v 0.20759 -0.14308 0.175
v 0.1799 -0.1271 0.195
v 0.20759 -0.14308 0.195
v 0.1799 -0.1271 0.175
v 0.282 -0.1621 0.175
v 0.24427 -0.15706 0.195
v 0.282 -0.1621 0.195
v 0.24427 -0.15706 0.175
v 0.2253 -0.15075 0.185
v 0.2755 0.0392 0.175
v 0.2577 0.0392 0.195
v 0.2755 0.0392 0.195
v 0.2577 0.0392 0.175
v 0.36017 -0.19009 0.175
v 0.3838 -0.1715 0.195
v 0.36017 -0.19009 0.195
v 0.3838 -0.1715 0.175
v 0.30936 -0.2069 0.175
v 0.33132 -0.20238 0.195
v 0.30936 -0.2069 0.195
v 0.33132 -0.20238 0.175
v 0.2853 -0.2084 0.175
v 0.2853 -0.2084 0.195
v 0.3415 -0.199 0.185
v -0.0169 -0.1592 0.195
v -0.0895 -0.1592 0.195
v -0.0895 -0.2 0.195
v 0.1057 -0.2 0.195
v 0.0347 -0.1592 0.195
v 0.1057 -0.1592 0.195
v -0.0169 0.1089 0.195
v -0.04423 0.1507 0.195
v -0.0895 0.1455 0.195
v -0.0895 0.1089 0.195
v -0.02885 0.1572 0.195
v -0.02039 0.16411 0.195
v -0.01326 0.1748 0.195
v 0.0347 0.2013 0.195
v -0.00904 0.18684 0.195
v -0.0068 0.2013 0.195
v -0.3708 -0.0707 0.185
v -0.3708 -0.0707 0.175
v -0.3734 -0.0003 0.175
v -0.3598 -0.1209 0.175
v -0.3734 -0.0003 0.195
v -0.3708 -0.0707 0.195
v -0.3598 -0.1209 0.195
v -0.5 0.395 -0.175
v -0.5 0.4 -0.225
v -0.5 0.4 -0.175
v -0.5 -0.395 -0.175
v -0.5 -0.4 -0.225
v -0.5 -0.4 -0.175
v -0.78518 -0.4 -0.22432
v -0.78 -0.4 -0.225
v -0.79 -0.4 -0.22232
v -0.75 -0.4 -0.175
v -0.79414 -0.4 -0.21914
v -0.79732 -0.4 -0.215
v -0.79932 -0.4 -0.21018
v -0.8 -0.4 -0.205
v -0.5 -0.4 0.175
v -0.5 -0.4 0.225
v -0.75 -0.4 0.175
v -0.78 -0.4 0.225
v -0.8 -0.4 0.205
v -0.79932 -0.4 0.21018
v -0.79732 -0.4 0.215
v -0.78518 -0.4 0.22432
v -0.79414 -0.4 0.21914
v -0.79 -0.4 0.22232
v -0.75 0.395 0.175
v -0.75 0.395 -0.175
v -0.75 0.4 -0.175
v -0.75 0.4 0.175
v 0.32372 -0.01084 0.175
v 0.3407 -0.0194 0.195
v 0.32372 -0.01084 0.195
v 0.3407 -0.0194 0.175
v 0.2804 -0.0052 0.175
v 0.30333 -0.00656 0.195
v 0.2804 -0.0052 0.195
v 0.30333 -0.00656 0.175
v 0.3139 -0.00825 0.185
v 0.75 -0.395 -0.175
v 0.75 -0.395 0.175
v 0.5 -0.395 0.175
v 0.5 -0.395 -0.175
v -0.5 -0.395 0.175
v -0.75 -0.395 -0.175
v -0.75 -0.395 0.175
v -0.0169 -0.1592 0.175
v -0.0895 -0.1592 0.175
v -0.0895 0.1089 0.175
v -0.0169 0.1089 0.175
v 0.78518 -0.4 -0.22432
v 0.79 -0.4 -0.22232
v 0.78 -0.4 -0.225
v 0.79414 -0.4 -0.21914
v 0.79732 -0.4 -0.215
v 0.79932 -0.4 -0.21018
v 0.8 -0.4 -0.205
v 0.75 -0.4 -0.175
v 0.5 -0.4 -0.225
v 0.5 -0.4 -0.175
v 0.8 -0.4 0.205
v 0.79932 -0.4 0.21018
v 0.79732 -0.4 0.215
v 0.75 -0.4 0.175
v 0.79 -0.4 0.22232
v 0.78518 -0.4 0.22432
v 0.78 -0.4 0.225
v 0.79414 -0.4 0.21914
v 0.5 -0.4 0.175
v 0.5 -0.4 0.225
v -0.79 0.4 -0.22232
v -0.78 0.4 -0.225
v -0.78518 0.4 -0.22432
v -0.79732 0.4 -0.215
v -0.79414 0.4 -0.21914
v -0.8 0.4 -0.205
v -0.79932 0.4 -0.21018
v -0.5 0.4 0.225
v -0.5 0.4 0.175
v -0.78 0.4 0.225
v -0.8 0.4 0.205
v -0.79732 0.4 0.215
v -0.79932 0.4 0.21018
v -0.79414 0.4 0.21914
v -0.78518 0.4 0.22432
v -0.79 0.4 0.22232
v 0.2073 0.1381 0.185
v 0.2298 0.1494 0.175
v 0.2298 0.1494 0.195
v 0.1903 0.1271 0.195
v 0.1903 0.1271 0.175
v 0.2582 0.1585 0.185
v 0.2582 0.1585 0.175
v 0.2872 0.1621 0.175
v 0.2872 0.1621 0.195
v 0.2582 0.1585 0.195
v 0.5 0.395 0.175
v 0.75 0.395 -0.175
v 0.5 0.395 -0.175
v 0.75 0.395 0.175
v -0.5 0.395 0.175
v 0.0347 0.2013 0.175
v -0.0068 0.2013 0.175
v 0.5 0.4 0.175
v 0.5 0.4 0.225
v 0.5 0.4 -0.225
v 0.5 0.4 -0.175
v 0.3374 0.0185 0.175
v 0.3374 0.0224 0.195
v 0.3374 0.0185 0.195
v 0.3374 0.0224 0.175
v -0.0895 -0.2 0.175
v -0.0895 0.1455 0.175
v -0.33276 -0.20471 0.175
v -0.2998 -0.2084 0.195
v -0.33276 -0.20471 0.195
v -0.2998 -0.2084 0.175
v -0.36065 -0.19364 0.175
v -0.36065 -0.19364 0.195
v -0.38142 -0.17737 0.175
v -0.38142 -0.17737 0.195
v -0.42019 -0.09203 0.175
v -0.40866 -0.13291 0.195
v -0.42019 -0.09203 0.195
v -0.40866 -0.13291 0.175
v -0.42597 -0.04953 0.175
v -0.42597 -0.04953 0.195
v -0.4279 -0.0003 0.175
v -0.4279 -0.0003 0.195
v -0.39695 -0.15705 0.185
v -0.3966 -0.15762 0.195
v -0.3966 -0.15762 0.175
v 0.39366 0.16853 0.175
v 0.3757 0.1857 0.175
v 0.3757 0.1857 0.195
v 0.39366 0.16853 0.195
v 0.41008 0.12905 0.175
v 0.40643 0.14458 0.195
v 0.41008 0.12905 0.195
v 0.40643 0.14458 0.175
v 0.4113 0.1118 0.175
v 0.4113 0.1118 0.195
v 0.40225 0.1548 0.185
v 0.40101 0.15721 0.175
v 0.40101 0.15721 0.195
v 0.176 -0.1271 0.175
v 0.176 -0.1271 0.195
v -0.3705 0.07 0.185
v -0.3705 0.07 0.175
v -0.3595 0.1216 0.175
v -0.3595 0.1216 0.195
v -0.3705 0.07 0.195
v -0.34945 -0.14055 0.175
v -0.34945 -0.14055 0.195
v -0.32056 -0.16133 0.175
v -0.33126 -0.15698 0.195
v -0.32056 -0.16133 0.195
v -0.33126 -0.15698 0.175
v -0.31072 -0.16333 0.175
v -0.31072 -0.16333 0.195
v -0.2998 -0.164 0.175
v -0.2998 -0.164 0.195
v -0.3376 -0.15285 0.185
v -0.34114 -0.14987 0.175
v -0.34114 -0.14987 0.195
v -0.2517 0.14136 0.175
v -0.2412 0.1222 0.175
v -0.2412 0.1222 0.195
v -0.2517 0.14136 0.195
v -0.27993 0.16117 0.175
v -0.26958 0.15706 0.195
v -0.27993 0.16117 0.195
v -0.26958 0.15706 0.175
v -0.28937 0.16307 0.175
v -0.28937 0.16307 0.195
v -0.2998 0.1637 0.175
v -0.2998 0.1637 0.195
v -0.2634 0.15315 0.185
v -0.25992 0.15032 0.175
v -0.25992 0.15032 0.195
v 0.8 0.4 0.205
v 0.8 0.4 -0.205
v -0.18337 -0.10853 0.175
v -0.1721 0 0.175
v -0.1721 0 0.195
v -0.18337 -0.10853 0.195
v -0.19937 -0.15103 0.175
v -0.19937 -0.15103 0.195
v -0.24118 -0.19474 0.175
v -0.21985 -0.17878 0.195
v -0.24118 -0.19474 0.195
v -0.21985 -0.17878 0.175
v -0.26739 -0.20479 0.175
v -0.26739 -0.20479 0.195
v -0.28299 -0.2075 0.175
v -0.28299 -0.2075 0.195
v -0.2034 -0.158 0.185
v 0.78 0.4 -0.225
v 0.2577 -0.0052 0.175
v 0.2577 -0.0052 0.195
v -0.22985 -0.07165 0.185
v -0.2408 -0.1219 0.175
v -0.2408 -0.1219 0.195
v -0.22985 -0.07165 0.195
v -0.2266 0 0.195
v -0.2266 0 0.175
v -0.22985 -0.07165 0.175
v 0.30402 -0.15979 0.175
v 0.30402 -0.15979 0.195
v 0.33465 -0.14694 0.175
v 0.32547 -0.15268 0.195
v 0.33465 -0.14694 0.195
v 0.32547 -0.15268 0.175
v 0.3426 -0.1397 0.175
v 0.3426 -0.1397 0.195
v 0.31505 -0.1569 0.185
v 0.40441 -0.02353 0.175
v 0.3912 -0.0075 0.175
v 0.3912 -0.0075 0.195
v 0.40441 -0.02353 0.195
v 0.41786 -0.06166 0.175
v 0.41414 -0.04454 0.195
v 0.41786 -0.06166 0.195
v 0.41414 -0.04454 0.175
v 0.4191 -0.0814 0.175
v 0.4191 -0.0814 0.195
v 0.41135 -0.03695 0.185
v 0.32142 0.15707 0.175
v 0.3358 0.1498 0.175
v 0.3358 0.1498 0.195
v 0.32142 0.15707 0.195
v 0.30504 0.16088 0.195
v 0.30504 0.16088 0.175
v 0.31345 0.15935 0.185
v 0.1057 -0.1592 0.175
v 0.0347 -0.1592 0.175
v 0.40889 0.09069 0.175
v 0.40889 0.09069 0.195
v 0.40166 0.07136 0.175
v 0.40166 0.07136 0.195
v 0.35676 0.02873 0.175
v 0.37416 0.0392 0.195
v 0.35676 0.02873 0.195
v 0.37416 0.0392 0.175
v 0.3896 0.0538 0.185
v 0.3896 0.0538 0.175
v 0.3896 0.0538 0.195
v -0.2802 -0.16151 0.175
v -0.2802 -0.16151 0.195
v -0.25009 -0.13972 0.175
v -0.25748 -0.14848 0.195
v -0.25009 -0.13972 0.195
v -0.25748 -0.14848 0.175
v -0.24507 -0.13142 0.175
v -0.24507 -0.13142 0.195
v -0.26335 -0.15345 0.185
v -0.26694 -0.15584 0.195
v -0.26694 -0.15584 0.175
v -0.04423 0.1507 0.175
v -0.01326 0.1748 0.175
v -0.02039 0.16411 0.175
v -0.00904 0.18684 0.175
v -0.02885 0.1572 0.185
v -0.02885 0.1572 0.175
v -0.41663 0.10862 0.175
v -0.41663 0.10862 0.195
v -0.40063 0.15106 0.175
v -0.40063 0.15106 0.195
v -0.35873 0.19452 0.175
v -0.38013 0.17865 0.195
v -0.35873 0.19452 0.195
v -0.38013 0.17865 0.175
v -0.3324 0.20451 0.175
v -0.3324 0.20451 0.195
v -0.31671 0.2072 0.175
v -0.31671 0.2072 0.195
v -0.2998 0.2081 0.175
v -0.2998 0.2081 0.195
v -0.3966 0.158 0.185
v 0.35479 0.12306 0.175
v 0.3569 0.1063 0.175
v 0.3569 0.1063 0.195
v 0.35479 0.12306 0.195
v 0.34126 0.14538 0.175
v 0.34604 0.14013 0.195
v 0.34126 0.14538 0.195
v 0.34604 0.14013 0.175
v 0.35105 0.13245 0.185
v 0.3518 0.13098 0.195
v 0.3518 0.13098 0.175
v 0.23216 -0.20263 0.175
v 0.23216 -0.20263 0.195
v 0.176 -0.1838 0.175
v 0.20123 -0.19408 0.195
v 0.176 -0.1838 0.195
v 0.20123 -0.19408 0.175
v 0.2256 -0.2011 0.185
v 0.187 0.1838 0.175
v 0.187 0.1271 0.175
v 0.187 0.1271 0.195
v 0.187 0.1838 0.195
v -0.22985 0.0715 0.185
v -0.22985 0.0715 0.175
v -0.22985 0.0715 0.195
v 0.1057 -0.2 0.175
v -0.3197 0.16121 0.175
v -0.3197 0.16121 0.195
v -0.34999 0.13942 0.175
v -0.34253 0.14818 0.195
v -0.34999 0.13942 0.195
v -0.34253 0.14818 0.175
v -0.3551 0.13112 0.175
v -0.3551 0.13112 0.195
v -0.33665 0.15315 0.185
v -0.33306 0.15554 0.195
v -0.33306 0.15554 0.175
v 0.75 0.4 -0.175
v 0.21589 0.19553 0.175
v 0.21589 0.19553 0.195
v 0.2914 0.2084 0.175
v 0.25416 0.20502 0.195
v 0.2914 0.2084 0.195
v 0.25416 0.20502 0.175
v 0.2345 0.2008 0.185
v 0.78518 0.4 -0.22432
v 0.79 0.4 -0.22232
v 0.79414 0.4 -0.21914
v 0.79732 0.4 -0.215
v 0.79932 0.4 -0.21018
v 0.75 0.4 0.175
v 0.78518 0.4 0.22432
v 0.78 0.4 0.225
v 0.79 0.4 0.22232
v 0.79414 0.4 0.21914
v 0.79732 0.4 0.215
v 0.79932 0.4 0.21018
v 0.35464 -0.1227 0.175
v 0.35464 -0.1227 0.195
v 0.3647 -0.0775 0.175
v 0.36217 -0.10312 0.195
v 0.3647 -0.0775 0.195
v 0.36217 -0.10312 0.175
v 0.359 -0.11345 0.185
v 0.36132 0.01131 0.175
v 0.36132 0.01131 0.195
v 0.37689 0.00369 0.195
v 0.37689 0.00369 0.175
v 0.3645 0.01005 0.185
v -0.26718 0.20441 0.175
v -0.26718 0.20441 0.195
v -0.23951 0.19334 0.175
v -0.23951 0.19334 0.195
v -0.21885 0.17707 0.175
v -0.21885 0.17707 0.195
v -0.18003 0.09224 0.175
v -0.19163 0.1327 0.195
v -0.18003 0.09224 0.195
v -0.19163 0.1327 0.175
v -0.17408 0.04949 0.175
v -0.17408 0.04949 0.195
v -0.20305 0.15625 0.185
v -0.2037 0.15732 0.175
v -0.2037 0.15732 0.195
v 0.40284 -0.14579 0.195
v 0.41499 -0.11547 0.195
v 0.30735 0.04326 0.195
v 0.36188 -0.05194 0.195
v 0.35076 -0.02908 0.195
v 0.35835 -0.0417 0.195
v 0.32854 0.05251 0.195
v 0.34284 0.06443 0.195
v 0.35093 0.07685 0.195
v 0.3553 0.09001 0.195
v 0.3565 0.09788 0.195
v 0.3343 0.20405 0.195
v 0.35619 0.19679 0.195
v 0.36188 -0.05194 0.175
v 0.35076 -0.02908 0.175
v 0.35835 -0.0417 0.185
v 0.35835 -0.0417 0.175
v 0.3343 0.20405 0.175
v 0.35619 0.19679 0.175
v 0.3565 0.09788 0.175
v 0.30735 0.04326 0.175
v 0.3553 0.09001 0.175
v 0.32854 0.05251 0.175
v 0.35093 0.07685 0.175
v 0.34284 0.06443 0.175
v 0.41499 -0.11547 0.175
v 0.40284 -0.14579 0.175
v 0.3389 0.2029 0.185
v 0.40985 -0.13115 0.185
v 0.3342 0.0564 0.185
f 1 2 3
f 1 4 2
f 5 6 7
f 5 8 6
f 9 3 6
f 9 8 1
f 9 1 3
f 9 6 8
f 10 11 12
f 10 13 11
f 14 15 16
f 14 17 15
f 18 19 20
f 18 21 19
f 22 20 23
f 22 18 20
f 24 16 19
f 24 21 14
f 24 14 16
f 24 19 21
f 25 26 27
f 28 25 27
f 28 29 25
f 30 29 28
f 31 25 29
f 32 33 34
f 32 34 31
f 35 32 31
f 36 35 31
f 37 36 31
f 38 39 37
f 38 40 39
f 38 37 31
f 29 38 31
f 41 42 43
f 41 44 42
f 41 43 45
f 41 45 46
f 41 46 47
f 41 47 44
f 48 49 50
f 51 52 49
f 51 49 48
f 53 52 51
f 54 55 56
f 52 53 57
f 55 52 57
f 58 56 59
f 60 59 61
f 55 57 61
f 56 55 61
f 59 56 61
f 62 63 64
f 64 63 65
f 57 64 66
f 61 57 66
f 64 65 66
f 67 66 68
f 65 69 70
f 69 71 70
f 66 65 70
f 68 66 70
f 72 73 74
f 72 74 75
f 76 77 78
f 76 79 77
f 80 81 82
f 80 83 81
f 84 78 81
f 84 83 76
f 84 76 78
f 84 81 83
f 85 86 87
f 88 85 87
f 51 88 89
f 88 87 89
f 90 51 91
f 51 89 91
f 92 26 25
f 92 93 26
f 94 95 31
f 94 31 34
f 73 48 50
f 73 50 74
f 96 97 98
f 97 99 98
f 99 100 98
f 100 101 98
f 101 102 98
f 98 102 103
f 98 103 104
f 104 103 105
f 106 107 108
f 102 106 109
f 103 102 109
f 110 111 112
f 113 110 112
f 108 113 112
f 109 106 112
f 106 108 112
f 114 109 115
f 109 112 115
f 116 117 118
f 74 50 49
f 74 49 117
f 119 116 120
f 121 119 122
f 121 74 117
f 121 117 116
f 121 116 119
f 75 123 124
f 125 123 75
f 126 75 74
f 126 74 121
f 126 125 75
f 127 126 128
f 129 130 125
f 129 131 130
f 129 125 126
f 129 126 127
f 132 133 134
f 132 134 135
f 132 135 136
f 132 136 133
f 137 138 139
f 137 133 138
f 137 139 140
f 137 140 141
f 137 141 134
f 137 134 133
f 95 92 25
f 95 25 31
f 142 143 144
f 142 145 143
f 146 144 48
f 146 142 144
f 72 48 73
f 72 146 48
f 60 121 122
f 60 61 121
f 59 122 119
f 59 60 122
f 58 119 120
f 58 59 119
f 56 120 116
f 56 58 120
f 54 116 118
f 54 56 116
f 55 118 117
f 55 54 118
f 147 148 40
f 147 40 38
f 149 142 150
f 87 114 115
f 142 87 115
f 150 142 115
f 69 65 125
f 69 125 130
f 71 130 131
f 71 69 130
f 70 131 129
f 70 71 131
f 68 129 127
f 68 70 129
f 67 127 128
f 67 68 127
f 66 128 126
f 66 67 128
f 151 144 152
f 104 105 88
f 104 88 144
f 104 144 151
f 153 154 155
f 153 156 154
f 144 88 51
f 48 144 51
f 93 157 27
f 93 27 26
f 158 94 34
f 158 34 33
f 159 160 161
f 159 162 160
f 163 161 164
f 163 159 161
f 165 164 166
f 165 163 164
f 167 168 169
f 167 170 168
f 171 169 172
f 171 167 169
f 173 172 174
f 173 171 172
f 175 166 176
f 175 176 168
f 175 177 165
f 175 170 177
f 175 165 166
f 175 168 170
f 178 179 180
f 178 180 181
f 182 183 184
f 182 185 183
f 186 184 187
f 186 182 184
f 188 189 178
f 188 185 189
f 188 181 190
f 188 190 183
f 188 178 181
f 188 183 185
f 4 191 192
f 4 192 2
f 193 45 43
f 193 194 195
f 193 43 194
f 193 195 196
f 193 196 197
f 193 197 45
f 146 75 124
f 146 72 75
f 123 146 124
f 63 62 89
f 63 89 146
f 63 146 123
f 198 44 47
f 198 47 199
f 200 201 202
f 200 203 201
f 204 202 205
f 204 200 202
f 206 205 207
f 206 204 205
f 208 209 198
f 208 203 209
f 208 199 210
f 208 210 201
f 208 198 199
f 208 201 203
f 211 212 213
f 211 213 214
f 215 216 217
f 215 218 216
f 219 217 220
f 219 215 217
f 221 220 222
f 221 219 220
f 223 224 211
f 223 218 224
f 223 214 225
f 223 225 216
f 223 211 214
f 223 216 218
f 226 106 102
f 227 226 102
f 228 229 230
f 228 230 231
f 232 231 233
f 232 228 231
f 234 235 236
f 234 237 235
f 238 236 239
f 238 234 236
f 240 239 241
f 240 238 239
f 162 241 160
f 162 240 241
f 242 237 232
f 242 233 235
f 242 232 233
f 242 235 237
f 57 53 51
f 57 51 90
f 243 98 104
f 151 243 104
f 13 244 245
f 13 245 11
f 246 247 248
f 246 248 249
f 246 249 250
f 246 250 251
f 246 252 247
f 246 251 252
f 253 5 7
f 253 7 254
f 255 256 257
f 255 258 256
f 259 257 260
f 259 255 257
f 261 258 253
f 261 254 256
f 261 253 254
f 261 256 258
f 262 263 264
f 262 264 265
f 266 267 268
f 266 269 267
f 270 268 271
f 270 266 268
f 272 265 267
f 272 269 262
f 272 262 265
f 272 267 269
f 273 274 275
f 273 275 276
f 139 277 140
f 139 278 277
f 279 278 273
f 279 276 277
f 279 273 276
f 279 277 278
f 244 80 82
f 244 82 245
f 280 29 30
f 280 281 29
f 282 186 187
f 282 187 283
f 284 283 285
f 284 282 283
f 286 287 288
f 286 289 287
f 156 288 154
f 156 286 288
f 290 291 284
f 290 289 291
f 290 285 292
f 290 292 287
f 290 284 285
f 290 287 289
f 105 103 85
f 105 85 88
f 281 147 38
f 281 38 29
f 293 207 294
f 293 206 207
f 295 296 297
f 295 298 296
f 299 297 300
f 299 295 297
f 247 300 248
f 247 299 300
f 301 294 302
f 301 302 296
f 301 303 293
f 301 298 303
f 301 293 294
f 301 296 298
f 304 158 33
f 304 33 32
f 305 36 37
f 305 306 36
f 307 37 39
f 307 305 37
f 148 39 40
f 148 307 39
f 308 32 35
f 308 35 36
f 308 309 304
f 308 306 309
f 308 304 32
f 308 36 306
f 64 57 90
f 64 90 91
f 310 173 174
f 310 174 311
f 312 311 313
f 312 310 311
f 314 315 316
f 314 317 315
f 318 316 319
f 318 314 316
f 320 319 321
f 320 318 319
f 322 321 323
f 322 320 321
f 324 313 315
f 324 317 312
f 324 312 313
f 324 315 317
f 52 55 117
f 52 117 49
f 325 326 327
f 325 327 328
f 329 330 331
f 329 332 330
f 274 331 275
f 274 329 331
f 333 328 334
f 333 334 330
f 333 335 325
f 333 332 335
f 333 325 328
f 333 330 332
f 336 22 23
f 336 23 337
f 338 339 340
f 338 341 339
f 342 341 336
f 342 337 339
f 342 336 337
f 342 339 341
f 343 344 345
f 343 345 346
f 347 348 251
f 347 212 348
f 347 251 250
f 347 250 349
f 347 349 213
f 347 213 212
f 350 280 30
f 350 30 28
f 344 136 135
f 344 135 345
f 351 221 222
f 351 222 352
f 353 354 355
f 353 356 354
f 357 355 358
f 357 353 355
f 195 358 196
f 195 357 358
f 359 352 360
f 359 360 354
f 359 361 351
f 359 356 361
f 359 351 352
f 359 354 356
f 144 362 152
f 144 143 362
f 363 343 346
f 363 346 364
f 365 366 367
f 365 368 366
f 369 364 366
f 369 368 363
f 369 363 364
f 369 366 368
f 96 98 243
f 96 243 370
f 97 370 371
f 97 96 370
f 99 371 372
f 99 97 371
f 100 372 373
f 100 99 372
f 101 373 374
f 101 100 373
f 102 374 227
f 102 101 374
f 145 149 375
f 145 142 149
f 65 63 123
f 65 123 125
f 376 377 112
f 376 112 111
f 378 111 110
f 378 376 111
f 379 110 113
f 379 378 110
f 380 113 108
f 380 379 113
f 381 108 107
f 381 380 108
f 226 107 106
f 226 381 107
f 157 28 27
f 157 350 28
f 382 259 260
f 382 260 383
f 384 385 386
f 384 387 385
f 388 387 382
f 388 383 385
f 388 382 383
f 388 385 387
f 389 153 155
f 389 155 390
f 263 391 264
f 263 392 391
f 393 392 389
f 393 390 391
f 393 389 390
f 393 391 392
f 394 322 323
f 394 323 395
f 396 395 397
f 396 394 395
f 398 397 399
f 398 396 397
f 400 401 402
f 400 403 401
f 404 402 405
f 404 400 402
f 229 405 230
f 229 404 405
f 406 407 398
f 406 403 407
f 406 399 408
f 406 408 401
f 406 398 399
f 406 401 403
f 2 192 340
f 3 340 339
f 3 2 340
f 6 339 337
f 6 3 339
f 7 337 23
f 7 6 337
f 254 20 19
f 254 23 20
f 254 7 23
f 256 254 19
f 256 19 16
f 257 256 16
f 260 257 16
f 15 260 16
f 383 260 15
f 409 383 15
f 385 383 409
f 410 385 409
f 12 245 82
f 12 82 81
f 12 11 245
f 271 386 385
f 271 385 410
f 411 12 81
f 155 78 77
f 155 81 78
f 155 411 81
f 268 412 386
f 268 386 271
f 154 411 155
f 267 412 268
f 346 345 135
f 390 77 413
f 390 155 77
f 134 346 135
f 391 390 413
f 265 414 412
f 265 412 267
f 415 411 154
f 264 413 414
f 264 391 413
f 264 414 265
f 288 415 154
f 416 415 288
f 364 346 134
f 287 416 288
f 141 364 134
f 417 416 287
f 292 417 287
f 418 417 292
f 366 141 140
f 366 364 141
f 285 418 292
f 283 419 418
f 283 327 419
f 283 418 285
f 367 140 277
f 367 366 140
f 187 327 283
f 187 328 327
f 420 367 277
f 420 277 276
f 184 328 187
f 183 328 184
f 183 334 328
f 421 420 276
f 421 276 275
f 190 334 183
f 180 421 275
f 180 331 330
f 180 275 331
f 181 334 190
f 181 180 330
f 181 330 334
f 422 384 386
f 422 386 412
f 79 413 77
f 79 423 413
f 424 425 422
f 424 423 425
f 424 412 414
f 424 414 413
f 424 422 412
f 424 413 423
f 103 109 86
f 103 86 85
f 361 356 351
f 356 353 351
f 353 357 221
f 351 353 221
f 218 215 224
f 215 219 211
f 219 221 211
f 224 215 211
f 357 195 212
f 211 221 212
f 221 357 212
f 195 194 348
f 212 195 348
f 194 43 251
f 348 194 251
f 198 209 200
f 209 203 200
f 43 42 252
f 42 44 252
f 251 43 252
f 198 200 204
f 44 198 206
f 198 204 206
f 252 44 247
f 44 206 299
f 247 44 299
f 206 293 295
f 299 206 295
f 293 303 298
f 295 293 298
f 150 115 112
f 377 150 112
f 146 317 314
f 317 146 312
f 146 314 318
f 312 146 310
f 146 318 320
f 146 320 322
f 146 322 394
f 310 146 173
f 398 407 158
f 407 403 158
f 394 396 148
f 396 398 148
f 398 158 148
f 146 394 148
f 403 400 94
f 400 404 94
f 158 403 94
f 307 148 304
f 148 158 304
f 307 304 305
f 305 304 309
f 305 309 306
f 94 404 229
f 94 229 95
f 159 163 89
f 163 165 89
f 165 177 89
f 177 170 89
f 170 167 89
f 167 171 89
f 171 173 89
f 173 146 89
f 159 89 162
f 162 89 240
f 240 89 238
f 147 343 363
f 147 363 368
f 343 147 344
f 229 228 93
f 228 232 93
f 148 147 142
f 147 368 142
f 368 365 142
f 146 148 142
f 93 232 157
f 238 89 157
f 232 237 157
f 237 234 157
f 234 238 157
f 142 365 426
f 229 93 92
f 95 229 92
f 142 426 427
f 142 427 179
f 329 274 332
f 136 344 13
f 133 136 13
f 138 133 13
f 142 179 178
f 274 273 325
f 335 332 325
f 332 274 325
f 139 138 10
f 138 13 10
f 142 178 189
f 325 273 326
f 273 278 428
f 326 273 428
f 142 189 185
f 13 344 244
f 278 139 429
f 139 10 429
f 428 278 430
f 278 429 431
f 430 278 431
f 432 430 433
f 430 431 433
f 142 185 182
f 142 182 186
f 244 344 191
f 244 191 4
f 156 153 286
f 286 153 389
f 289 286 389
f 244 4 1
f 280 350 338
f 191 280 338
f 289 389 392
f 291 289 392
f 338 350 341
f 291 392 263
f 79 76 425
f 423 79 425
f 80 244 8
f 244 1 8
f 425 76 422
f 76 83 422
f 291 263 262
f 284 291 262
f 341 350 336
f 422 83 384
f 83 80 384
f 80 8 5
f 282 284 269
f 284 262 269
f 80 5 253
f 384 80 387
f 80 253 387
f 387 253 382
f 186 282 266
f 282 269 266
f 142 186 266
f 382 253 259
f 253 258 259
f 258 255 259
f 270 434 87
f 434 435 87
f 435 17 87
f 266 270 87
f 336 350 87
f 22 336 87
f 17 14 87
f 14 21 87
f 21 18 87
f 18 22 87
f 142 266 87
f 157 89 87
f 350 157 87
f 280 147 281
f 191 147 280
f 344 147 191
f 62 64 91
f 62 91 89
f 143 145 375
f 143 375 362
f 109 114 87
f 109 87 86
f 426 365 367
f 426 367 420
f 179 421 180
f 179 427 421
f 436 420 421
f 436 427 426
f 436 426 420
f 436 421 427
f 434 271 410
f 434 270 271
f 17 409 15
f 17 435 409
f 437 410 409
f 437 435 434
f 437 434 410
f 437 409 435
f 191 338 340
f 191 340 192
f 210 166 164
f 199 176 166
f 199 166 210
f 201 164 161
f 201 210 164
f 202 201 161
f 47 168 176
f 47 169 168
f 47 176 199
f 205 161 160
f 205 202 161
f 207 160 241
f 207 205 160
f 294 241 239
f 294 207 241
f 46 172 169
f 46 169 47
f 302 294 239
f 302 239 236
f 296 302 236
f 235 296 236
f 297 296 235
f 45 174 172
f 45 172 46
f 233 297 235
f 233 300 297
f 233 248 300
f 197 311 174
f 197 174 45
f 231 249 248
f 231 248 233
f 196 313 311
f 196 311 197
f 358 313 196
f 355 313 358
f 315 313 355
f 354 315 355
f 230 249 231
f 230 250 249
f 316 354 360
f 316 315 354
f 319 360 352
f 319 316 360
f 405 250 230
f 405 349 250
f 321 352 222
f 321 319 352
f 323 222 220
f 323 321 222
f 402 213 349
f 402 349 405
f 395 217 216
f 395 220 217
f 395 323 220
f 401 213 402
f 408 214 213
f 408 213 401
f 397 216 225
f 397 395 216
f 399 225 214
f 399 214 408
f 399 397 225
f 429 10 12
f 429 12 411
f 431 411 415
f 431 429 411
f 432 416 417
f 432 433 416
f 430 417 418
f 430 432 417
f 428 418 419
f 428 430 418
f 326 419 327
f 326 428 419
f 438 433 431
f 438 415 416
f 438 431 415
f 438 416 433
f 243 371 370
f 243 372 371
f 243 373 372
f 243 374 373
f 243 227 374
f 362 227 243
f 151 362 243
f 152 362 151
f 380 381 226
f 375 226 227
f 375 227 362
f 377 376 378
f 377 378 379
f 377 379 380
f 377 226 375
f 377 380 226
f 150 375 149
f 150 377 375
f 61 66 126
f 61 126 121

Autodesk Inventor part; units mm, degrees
ref_plane "YZ Plane" through (0, 0, 0) normal (1, 0, 0) x (0, 1, 0)
ref_plane "XZ Plane" through (0, 0, 0) normal (0, 1, 0) x (-1, 0, 0)
ref_plane "XY Plane" through (0, 0, 0) normal (0, 0, 1) x (1, 0, 0)
sketch "Sketch1" plane through (0, 0, 0) normal (0, 1, 0) x (-1, 0, 0)
  line L0 (0.75, 0.175) -> (-0.75, 0.175)
  line L1 (-0.75, 0.175) -> (-0.75, -0.175)
  line L2 (-0.75, -0.175) -> (0.75, -0.175)
  line L3 (0.75, -0.175) -> (0.75, 0.175)
  line L4 (0.5, 0.175) -> (0.5, 0.225)
  line L5 (0.5, 0.225) -> (0.8, 0.225)
  line L6 (0.8, 0.225) -> (0.8, -0.225)
  line L7 (0.8, -0.225) -> (0.5, -0.225)
  line L8 (0.5, -0.225) -> (0.5, -0.175)
  line L9 (-0.5, 0.175) -> (-0.5, 0.225)
  line L10 (-0.5, 0.225) -> (-0.8, 0.225)
  line L11 (-0.8, 0.225) -> (-0.8, -0.225)
  line L12 (-0.8, -0.225) -> (-0.5, -0.225)
  line L13 (-0.5, -0.175) -> (-0.5, -0.225)
  line L14 (0.5, 0.175) -> (-0.5, 0.175)
  point P0 (0, 0)
  point P1 (0, 0.175)
  point P2 (0.75, 0)
  dimension "d0" = 1.6
  dimension "d1" = 0.05
  dimension "d2" = 0.05
  dimension "d3" = 0.45
  dimension "d4" = 0.3
extrude "Extrusion1" add sketch "Sketch1" along normal mid plane 0.8 contours L0 L4 L5 L6 L7 L8 L2 L3 | L0 L1 L2 L13 L12 L11 L10 L9
extrude "Extrusion2" add sketch "Sketch1" along normal mid plane 0.79 contours L3 L2 L1 L0
sketch "Sketch2" plane through (-0.5, -0.395, 0.175) normal (0, 0, 1) x (1, 0, 0)
  line L0 (0, 0) -> (0, 0.79) projected
  line L1 (1, 0) -> (0, 0) projected
  line L2 (1, 0) -> (1, 0.79) projected
  line L3 (0, 0.79) -> (1, 0.79) projected
  line L4 (0, 0.395) -> (1, 0.395) construction
  spline S0 degree 2 poles (0.3279, 0.395) (0.3279, 0.2874) (0.2653, 0.1866) (0.2002, 0.1866) knots 0 0 0 1 2 2 2
  spline S1 degree 2 poles (0.2002, 0.1866) (0.134, 0.1866) (0.0721, 0.2893) (0.0721, 0.3947) knots 0 0 0 1 2 2 2
  spline S2 degree 2 poles (0.0721, 0.3947) (0.0721, 0.5029) (0.1347, 0.6031) (0.2002, 0.6031) knots 0 0 0 1 2 2 2
  spline S3 degree 2 poles (0.2002, 0.6031) (0.266, 0.6031) (0.3279, 0.4994) (0.3279, 0.395) knots 0 0 0 1 2 2 2
  spline S4 degree 2 poles (0.2592, 0.2731) (0.2669, 0.2929) (0.2734, 0.3538) (0.2734, 0.395) knots 0 0 0 1 2 2 2
  spline S5 degree 2 poles (0.2734, 0.395) (0.2734, 0.4362) (0.2669, 0.4968) (0.2588, 0.5172) knots 0 0 0 1 2 2 2
  spline S6 degree 2 poles (0.2588, 0.5172) (0.2507, 0.5376) (0.2225, 0.5587) (0.2002, 0.5587) knots 0 0 0 1 2 2 2
  spline S7 degree 2 poles (0.2002, 0.5587) (0.1778, 0.5587) (0.1489, 0.5376) (0.1405, 0.5166) knots 0 0 0 1 2 2 2
  spline S8 degree 2 poles (0.1405, 0.5166) (0.1324, 0.4961) (0.1266, 0.4339) (0.1266, 0.3947) knots 0 0 0 1 2 2 2
  spline S9 degree 2 poles (0.1266, 0.3947) (0.1266, 0.3525) (0.1318, 0.2961) (0.1402, 0.2741) knots 0 0 0 1 2 2 2
  spline S10 degree 2 poles (0.1402, 0.2741) (0.148, 0.2533) (0.1768, 0.231) (0.2002, 0.231) knots 0 0 0 1 2 2 2
  spline S11 degree 2 poles (0.2002, 0.231) (0.2222, 0.231) (0.2511, 0.2521) (0.2592, 0.2731) knots 0 0 0 1 2 2 2
  line L5 (0.6057, 0.195) -> (0.4105, 0.195)
  line L6 (0.4105, 0.195) -> (0.4105, 0.2358)
  line L7 (0.4105, 0.2358) -> (0.4831, 0.2358)
  line L8 (0.4831, 0.2358) -> (0.4831, 0.5039)
  line L9 (0.4831, 0.5039) -> (0.4105, 0.5039)
  line L10 (0.4105, 0.5039) -> (0.4105, 0.5405)
  spline S12 degree 2 poles (0.4105, 0.5405) (0.4517, 0.5405) (0.4906, 0.5639) (0.4932, 0.5963) knots 0 0 0 1 2 2 2
  line L11 (0.4932, 0.5963) -> (0.5347, 0.5963)
  line L12 (0.5347, 0.5963) -> (0.5347, 0.2358)
  line L13 (0.5347, 0.2358) -> (0.6057, 0.2358)
  line L14 (0.6057, 0.2358) -> (0.6057, 0.195)
  spline S13 degree 2 poles (0.7872, 0.5571) (0.7726, 0.5571) (0.7438, 0.5499) (0.7298, 0.5444) knots 0 0 0 1 2 2 2
  spline S14 degree 2 poles (0.7298, 0.5444) (0.7169, 0.5389) (0.6977, 0.5273) (0.6903, 0.5221) knots 0 0 0 1 2 2 2
  line L15 (0.6903, 0.5221) -> (0.687, 0.5221)
  line L16 (0.687, 0.5221) -> (0.687, 0.5788)
  spline S15 degree 2 poles (0.687, 0.5788) (0.7045, 0.5882) (0.7645, 0.6034) (0.7914, 0.6034) knots 0 0 0 1 2 2 2
  spline S16 degree 2 poles (0.7914, 0.6034) (0.8186, 0.6034) (0.8592, 0.5924) (0.8757, 0.5807) knots 0 0 0 1 2 2 2
  spline S17 degree 2 poles (0.8757, 0.5807) (0.8932, 0.5681) (0.9113, 0.5315) (0.9113, 0.5068) knots 0 0 0 1 2 2 2
  spline S18 degree 2 poles (0.9113, 0.5068) (0.9113, 0.4738) (0.8679, 0.4238) (0.8374, 0.4174) knots 0 0 0 1 2 2 2
  line L17 (0.8374, 0.4174) -> (0.8374, 0.4135)
  spline S19 degree 2 poles (0.8374, 0.4135) (0.8501, 0.4109) (0.8789, 0.3992) (0.8912, 0.3875) knots 0 0 0 1 2 2 2
  spline S20 degree 2 poles (0.8912, 0.3875) (0.9036, 0.3762) (0.9191, 0.3399) (0.9191, 0.3136) knots 0 0 0 1 2 2 2
  spline S21 degree 2 poles (0.9191, 0.3136) (0.9191, 0.2867) (0.9006, 0.241) (0.8838, 0.2235) knots 0 0 0 1 2 2 2
  spline S22 degree 2 poles (0.8838, 0.2235) (0.8663, 0.2054) (0.8167, 0.1866) (0.7853, 0.1866) knots 0 0 0 1 2 2 2
  spline S23 degree 2 poles (0.7853, 0.1866) (0.7551, 0.1866) (0.6961, 0.2012) (0.676, 0.2112) knots 0 0 0 1 2 2 2
  line L18 (0.676, 0.2112) -> (0.676, 0.2679)
  line L19 (0.676, 0.2679) -> (0.6799, 0.2679)
  spline S24 degree 2 poles (0.6799, 0.2679) (0.6968, 0.2556) (0.7538, 0.2329) (0.782, 0.2329) knots 0 0 0 1 2 2 2
  spline S25 degree 2 poles (0.782, 0.2329) (0.7985, 0.2329) (0.8316, 0.2433) (0.8426, 0.2553) knots 0 0 0 1 2 2 2
  spline S26 degree 2 poles (0.8426, 0.2553) (0.8533, 0.2673) (0.8647, 0.2958) (0.8647, 0.3175) knots 0 0 0 1 2 2 2
  spline S27 degree 2 poles (0.8647, 0.3175) (0.8647, 0.3392) (0.852, 0.3674) (0.8407, 0.3756) knots 0 0 0 1 2 2 2
  spline S28 degree 2 poles (0.8407, 0.3756) (0.8293, 0.3837) (0.7985, 0.3898) (0.7804, 0.3898) knots 0 0 0 1 2 2 2
  line L20 (0.7804, 0.3898) -> (0.7577, 0.3898)
  line L21 (0.7577, 0.3898) -> (0.7577, 0.4342)
  line L22 (0.7577, 0.4342) -> (0.7755, 0.4342)
  spline S29 degree 2 poles (0.7755, 0.4342) (0.8115, 0.4342) (0.8569, 0.4686) (0.8569, 0.5013) knots 0 0 0 1 2 2 2
  spline S30 degree 2 poles (0.8569, 0.5013) (0.8569, 0.5166) (0.8452, 0.5383) (0.8358, 0.5448) knots 0 0 0 1 2 2 2
  spline S31 degree 2 poles (0.8358, 0.5448) (0.8258, 0.5516) (0.8011, 0.5571) (0.7872, 0.5571) knots 0 0 0 1 2 2 2
  point P0 (0.5, 0.395)
extrude "Extrusion3" add sketch "Sketch2" along normal blind 0.02 contours S0 S1 S2 S3 | L5 L6 L7 L8 L9 L10 S12 L11 L12 L13 L14 | S13 S14 L15 L16 S15 S16 S17 S18 L17 S19 S20 S21 S22 S23 L18 L19 S24 S25 S26 S27 S28 L20 L21 L22 S29 S30 S31
fillet "Fillet1" radius 0.02 4 edges at (-0.8, 0, 0.225) (-0.8, 0, -0.225) (0.8, 0, 0.225) (0.8, 0, -0.225)
equation "\"d2\" = d1"
properties part number "21-1001" material "Copper"
